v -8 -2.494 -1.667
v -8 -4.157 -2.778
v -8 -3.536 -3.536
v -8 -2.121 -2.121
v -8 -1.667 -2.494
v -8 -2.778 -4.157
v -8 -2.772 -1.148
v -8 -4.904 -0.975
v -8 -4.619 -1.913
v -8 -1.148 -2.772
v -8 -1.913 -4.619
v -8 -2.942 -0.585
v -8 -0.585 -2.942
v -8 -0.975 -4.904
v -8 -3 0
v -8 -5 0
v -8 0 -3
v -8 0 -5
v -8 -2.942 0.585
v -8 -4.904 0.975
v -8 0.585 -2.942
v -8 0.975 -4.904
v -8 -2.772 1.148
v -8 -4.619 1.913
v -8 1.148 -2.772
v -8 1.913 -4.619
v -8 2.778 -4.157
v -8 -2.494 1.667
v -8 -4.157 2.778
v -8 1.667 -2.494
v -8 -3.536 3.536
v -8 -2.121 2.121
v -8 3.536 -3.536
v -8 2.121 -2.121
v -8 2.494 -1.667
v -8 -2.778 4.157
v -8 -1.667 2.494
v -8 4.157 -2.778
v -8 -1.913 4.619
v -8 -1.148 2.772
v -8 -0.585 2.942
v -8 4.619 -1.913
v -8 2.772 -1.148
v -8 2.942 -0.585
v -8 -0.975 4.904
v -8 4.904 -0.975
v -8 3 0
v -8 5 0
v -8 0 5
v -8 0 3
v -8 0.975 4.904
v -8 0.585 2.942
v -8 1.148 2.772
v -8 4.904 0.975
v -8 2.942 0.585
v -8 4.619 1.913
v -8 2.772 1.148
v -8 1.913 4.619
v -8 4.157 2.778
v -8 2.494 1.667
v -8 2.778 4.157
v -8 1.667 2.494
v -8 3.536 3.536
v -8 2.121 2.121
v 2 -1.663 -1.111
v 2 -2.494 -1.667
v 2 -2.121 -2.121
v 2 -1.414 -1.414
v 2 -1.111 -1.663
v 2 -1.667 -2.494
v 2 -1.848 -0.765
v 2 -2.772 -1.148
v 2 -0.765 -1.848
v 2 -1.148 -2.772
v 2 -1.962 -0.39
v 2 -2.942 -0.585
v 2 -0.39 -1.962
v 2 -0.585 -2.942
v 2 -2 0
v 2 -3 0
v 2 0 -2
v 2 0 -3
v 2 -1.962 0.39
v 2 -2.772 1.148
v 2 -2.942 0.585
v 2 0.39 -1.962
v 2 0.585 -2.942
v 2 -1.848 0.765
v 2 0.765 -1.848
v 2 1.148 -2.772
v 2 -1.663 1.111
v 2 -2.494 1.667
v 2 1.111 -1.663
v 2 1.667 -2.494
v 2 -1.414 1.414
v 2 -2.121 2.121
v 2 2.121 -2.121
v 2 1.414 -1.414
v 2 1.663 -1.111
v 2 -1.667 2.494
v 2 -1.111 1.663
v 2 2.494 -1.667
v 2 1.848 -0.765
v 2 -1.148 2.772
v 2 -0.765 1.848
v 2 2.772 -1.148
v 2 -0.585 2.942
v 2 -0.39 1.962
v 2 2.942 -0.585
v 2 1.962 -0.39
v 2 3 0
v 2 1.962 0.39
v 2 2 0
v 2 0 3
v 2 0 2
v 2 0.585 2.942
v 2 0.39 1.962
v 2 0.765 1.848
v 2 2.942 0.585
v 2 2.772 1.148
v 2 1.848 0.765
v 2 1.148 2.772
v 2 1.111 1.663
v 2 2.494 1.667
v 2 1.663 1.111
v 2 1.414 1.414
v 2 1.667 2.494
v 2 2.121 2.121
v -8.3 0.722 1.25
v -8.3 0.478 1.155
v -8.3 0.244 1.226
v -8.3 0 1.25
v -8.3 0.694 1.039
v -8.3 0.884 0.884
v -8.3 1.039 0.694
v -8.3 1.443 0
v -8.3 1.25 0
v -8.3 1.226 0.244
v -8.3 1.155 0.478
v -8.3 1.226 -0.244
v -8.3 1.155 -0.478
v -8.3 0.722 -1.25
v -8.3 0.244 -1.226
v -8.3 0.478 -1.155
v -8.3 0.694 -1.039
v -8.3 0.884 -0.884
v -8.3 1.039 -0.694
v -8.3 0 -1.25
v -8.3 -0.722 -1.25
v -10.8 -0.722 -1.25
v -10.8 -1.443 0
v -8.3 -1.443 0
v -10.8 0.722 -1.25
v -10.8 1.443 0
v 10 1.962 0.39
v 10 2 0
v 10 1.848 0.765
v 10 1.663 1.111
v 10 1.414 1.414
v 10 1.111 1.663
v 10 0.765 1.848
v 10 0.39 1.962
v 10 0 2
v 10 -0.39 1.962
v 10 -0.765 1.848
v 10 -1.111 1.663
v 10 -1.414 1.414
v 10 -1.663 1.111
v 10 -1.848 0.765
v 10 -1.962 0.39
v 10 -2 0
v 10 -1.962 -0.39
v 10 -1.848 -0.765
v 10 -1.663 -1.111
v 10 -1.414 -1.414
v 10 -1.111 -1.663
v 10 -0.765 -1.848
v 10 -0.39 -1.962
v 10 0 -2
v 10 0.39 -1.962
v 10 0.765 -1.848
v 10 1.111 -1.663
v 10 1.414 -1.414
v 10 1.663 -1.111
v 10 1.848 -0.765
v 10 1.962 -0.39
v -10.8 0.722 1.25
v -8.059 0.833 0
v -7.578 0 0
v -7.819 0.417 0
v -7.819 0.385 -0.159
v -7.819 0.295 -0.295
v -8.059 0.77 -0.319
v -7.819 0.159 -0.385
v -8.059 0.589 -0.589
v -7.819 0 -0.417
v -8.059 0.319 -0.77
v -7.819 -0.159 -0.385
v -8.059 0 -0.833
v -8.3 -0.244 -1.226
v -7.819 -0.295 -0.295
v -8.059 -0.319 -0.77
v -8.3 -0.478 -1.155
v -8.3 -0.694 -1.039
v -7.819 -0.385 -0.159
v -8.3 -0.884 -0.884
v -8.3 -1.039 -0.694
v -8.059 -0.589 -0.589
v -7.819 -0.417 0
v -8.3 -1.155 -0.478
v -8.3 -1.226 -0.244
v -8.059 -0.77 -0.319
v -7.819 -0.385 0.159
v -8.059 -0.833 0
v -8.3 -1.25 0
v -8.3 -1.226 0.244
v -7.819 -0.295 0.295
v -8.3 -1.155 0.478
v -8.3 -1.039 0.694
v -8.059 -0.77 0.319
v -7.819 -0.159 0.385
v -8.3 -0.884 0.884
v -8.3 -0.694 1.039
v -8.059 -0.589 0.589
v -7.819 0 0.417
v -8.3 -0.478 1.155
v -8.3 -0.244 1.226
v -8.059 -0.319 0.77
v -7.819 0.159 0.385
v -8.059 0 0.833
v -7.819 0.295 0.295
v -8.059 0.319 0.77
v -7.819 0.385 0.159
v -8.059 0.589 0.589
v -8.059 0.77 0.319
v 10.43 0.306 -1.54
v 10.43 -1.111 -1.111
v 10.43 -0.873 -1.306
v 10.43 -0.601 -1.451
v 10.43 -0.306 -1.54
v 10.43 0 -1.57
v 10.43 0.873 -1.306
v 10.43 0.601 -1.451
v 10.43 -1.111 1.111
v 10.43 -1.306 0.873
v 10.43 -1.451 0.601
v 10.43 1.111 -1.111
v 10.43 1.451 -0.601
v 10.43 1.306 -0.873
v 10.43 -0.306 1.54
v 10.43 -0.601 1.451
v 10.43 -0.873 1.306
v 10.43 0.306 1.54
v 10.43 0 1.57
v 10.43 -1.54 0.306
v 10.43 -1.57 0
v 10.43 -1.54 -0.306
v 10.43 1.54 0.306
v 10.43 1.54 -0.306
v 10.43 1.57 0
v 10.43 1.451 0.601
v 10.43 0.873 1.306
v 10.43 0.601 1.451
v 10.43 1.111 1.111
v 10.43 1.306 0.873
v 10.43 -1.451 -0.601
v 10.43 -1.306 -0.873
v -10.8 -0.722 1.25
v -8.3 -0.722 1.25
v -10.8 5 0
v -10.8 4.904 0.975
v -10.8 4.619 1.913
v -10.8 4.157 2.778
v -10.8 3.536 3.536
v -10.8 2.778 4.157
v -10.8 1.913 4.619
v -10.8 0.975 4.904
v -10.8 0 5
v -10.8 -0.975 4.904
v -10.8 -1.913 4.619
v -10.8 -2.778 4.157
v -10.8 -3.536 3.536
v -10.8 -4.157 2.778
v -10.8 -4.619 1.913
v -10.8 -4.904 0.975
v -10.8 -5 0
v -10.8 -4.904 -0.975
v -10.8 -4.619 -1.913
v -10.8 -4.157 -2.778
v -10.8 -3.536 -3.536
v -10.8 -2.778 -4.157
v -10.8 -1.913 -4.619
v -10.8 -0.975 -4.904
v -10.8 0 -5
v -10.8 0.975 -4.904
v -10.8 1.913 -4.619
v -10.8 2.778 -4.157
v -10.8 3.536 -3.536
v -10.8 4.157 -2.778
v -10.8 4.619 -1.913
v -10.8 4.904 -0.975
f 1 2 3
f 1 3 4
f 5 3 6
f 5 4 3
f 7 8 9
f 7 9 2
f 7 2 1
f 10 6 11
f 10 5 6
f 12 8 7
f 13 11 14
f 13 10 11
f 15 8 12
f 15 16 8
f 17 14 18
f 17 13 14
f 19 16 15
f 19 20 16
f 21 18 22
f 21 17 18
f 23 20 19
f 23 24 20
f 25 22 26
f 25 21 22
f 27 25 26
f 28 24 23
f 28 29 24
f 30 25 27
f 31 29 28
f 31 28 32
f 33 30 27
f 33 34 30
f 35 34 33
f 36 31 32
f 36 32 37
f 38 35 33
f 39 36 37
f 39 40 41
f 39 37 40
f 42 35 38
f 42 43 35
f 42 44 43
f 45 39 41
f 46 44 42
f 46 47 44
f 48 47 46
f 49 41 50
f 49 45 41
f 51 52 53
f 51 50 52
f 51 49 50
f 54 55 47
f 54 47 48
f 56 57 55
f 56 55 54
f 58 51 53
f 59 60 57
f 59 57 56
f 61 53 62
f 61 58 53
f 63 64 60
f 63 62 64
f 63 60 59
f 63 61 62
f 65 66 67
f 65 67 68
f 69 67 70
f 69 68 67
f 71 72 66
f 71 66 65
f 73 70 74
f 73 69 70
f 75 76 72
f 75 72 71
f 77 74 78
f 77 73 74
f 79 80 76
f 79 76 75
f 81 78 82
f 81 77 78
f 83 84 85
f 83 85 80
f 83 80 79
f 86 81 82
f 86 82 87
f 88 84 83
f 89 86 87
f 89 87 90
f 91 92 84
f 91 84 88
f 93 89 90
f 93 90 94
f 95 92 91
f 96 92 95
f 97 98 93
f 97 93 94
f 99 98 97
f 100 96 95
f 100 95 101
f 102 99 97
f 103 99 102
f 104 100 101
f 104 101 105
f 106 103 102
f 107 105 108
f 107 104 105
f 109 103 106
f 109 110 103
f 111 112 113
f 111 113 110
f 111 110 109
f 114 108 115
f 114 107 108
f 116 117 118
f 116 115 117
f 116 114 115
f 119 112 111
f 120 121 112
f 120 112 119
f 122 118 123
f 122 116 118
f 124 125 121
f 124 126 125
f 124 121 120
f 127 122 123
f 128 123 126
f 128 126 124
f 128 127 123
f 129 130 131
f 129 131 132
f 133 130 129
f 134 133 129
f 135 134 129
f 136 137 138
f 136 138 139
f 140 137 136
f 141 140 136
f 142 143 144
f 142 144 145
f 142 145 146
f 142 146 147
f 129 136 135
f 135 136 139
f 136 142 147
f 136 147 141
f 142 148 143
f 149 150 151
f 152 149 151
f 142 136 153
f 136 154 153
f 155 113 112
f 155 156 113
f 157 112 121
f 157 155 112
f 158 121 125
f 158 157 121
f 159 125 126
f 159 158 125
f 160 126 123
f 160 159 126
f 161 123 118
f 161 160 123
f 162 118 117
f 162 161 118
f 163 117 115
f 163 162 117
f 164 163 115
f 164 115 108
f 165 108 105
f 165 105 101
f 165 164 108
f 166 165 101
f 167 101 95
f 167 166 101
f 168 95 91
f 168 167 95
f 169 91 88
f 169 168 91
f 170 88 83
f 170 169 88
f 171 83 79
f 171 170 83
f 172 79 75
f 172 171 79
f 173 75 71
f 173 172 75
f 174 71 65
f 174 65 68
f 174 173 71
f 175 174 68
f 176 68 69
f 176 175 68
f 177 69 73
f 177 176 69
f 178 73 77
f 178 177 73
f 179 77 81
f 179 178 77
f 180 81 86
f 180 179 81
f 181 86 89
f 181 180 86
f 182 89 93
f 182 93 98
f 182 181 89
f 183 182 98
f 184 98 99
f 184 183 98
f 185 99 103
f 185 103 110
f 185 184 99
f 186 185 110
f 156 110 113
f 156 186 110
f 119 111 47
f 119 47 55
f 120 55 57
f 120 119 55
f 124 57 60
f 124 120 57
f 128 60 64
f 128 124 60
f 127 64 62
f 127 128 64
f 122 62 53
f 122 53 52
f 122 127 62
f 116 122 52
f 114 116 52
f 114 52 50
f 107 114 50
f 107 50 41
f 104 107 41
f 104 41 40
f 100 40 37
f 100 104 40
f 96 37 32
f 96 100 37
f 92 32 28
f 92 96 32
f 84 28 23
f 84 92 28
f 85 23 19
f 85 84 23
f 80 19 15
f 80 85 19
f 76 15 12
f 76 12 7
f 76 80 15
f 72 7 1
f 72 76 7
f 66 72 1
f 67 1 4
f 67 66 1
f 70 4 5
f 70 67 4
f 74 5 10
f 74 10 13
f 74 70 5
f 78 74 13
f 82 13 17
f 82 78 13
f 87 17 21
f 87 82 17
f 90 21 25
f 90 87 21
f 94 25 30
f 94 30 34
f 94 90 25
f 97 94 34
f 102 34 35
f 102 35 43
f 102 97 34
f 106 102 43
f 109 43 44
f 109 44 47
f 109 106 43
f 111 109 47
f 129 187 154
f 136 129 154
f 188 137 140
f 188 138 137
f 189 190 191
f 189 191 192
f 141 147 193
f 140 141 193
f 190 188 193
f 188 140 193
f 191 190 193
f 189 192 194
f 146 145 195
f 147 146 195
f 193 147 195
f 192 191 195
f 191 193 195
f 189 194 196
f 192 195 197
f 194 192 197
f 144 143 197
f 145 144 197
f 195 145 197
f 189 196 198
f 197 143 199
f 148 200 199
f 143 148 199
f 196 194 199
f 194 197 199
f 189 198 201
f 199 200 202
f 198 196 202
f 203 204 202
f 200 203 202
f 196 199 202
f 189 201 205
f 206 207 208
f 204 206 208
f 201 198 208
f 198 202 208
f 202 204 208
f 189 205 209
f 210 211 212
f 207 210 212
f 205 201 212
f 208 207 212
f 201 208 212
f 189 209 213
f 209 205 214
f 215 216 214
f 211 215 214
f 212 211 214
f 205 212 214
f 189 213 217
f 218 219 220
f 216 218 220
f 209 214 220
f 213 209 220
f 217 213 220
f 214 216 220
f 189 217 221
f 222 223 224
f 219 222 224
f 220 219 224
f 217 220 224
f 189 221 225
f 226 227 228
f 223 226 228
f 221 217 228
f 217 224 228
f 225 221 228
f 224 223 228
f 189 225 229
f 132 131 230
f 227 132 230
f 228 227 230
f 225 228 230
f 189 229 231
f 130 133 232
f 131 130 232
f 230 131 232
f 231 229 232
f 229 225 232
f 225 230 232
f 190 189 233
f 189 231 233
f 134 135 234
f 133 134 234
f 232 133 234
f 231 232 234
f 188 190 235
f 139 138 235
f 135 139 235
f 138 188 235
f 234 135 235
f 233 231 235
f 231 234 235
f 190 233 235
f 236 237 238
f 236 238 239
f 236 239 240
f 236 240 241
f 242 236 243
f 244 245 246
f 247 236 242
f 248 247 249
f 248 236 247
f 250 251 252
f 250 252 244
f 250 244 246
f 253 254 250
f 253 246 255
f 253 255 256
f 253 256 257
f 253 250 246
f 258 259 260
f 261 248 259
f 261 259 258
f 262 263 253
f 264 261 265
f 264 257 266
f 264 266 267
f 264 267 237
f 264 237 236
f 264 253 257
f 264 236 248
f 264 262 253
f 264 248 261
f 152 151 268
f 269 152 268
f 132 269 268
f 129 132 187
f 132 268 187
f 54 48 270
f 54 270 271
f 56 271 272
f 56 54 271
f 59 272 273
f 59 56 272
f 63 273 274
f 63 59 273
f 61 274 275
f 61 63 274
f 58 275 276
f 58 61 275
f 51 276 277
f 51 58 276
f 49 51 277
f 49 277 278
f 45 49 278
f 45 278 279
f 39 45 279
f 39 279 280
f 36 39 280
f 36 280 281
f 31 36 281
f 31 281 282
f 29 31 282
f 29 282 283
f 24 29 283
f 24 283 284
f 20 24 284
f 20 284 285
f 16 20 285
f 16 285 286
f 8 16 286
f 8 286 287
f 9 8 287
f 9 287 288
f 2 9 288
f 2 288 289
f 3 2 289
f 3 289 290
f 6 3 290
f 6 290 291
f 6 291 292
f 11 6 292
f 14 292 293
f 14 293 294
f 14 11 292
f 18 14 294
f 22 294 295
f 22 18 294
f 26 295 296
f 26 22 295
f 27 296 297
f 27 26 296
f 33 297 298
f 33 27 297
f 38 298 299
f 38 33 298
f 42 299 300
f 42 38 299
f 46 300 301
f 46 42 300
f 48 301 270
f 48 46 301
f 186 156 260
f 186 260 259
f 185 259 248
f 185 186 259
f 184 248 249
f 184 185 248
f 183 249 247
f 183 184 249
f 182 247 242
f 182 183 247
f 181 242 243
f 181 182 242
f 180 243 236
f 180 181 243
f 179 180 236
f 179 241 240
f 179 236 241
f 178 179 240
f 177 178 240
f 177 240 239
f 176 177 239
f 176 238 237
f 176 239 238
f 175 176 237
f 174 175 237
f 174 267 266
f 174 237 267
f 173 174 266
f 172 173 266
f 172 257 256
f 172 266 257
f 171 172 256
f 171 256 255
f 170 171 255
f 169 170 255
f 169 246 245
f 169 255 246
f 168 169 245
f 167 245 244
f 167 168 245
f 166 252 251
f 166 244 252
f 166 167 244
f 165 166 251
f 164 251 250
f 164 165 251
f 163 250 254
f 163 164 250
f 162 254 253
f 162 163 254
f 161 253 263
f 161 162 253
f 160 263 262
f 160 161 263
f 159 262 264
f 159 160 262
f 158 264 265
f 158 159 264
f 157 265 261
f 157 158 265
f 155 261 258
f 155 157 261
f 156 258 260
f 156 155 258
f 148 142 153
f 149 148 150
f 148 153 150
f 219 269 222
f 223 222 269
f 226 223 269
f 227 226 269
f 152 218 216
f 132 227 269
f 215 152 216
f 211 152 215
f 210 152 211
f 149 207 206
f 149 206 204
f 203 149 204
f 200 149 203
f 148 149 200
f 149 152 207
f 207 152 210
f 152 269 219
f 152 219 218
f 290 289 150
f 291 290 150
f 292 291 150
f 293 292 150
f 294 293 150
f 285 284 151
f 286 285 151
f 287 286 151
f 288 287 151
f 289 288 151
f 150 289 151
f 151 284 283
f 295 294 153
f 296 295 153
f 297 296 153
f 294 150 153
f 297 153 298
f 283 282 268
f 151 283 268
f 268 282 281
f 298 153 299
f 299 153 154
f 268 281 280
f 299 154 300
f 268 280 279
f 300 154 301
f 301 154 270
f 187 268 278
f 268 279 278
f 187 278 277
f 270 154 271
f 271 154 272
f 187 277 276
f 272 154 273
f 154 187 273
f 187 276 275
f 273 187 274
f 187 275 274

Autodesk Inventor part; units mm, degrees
ref_plane "YZ Plane" through (0, 0, 0) normal (1, 0, 0) x (0, 1, 0)
ref_plane "XZ Plane" through (0, 0, 0) normal (0, 1, 0) x (-1, 0, 0)
ref_plane "XY Plane" through (0, 0, 0) normal (0, 0, 1) x (1, 0, 0)
sketch "Sketch_1" plane through (0, 0, 0) normal (0, 0, 1) x (1, 0, 0)
  line L0 (5, 0) -> (-10.8, 0)
  line L1 (-10.8, 0) -> (-10.8, 5)
  line L2 (-10.8, 5) -> (-8, 5)
  line L3 (-8, 5) -> (-8, 3)
  line L4 (-8, 3) -> (2, 3)
  line L5 (2, 3) -> (2, 2)
  line L6 (2, 2) -> (10, 2)
  line L7 (10, 2) -> (10.4295, 1.5705)
  line L8 (10.4295, 1.5705) -> (10.4295, 0)
  line L9 (10.4295, 0) -> (-10.8, 0)
  dimension "d6" = 2.8
  dimension "d7" = 10
  dimension "d8" = 8
revolve "Revolution1" add sketch "Sketch_1" angle 360 about axis through (5, 0, 0) along (1, 0, 0)
thread "Thread1" size "M4x0.7" class "6g" standard "ISO Metric profile" length 8
sketch "Sketch_2" plane through (-10.8, 0, 0) normal (-1, 0, 0) x (0, 1, 0)
  line L0 (-1.4434, 0) -> (-0.7217, -1.25)
  line L1 (-0.7217, -1.25) -> (0.7217, -1.25)
  line L2 (0.7217, -1.25) -> (1.4434, 0)
  line L3 (1.4434, 0) -> (0.7217, 1.25)
  line L4 (0.7217, 1.25) -> (-0.7217, 1.25)
  line L5 (-0.7217, 1.25) -> (-1.4434, 0)
extrude "Extrusion1" cut sketch "Sketch_2" against normal blind 2.5
sketch "Sketch_3" plane through (0, 0, 0) normal (0, 0, 1) x (1, 0, 0)
  line L0 (-7.5783, 0) -> (-8.3, 0)
  line L1 (-8.3, 0) -> (-8.3, 1.25)
  line L2 (-8.3, 1.25) -> (-7.5783, 0)
  line L3 (-7.5783, 0) -> (-8.3, 0)
revolve "Revolution2" cut sketch "Sketch_3" angle 360 about axis through (-7.5783, 0, 0) along (1, 0, 0)
properties part number "DBB4-10-8" material "스테인리스스틸"
